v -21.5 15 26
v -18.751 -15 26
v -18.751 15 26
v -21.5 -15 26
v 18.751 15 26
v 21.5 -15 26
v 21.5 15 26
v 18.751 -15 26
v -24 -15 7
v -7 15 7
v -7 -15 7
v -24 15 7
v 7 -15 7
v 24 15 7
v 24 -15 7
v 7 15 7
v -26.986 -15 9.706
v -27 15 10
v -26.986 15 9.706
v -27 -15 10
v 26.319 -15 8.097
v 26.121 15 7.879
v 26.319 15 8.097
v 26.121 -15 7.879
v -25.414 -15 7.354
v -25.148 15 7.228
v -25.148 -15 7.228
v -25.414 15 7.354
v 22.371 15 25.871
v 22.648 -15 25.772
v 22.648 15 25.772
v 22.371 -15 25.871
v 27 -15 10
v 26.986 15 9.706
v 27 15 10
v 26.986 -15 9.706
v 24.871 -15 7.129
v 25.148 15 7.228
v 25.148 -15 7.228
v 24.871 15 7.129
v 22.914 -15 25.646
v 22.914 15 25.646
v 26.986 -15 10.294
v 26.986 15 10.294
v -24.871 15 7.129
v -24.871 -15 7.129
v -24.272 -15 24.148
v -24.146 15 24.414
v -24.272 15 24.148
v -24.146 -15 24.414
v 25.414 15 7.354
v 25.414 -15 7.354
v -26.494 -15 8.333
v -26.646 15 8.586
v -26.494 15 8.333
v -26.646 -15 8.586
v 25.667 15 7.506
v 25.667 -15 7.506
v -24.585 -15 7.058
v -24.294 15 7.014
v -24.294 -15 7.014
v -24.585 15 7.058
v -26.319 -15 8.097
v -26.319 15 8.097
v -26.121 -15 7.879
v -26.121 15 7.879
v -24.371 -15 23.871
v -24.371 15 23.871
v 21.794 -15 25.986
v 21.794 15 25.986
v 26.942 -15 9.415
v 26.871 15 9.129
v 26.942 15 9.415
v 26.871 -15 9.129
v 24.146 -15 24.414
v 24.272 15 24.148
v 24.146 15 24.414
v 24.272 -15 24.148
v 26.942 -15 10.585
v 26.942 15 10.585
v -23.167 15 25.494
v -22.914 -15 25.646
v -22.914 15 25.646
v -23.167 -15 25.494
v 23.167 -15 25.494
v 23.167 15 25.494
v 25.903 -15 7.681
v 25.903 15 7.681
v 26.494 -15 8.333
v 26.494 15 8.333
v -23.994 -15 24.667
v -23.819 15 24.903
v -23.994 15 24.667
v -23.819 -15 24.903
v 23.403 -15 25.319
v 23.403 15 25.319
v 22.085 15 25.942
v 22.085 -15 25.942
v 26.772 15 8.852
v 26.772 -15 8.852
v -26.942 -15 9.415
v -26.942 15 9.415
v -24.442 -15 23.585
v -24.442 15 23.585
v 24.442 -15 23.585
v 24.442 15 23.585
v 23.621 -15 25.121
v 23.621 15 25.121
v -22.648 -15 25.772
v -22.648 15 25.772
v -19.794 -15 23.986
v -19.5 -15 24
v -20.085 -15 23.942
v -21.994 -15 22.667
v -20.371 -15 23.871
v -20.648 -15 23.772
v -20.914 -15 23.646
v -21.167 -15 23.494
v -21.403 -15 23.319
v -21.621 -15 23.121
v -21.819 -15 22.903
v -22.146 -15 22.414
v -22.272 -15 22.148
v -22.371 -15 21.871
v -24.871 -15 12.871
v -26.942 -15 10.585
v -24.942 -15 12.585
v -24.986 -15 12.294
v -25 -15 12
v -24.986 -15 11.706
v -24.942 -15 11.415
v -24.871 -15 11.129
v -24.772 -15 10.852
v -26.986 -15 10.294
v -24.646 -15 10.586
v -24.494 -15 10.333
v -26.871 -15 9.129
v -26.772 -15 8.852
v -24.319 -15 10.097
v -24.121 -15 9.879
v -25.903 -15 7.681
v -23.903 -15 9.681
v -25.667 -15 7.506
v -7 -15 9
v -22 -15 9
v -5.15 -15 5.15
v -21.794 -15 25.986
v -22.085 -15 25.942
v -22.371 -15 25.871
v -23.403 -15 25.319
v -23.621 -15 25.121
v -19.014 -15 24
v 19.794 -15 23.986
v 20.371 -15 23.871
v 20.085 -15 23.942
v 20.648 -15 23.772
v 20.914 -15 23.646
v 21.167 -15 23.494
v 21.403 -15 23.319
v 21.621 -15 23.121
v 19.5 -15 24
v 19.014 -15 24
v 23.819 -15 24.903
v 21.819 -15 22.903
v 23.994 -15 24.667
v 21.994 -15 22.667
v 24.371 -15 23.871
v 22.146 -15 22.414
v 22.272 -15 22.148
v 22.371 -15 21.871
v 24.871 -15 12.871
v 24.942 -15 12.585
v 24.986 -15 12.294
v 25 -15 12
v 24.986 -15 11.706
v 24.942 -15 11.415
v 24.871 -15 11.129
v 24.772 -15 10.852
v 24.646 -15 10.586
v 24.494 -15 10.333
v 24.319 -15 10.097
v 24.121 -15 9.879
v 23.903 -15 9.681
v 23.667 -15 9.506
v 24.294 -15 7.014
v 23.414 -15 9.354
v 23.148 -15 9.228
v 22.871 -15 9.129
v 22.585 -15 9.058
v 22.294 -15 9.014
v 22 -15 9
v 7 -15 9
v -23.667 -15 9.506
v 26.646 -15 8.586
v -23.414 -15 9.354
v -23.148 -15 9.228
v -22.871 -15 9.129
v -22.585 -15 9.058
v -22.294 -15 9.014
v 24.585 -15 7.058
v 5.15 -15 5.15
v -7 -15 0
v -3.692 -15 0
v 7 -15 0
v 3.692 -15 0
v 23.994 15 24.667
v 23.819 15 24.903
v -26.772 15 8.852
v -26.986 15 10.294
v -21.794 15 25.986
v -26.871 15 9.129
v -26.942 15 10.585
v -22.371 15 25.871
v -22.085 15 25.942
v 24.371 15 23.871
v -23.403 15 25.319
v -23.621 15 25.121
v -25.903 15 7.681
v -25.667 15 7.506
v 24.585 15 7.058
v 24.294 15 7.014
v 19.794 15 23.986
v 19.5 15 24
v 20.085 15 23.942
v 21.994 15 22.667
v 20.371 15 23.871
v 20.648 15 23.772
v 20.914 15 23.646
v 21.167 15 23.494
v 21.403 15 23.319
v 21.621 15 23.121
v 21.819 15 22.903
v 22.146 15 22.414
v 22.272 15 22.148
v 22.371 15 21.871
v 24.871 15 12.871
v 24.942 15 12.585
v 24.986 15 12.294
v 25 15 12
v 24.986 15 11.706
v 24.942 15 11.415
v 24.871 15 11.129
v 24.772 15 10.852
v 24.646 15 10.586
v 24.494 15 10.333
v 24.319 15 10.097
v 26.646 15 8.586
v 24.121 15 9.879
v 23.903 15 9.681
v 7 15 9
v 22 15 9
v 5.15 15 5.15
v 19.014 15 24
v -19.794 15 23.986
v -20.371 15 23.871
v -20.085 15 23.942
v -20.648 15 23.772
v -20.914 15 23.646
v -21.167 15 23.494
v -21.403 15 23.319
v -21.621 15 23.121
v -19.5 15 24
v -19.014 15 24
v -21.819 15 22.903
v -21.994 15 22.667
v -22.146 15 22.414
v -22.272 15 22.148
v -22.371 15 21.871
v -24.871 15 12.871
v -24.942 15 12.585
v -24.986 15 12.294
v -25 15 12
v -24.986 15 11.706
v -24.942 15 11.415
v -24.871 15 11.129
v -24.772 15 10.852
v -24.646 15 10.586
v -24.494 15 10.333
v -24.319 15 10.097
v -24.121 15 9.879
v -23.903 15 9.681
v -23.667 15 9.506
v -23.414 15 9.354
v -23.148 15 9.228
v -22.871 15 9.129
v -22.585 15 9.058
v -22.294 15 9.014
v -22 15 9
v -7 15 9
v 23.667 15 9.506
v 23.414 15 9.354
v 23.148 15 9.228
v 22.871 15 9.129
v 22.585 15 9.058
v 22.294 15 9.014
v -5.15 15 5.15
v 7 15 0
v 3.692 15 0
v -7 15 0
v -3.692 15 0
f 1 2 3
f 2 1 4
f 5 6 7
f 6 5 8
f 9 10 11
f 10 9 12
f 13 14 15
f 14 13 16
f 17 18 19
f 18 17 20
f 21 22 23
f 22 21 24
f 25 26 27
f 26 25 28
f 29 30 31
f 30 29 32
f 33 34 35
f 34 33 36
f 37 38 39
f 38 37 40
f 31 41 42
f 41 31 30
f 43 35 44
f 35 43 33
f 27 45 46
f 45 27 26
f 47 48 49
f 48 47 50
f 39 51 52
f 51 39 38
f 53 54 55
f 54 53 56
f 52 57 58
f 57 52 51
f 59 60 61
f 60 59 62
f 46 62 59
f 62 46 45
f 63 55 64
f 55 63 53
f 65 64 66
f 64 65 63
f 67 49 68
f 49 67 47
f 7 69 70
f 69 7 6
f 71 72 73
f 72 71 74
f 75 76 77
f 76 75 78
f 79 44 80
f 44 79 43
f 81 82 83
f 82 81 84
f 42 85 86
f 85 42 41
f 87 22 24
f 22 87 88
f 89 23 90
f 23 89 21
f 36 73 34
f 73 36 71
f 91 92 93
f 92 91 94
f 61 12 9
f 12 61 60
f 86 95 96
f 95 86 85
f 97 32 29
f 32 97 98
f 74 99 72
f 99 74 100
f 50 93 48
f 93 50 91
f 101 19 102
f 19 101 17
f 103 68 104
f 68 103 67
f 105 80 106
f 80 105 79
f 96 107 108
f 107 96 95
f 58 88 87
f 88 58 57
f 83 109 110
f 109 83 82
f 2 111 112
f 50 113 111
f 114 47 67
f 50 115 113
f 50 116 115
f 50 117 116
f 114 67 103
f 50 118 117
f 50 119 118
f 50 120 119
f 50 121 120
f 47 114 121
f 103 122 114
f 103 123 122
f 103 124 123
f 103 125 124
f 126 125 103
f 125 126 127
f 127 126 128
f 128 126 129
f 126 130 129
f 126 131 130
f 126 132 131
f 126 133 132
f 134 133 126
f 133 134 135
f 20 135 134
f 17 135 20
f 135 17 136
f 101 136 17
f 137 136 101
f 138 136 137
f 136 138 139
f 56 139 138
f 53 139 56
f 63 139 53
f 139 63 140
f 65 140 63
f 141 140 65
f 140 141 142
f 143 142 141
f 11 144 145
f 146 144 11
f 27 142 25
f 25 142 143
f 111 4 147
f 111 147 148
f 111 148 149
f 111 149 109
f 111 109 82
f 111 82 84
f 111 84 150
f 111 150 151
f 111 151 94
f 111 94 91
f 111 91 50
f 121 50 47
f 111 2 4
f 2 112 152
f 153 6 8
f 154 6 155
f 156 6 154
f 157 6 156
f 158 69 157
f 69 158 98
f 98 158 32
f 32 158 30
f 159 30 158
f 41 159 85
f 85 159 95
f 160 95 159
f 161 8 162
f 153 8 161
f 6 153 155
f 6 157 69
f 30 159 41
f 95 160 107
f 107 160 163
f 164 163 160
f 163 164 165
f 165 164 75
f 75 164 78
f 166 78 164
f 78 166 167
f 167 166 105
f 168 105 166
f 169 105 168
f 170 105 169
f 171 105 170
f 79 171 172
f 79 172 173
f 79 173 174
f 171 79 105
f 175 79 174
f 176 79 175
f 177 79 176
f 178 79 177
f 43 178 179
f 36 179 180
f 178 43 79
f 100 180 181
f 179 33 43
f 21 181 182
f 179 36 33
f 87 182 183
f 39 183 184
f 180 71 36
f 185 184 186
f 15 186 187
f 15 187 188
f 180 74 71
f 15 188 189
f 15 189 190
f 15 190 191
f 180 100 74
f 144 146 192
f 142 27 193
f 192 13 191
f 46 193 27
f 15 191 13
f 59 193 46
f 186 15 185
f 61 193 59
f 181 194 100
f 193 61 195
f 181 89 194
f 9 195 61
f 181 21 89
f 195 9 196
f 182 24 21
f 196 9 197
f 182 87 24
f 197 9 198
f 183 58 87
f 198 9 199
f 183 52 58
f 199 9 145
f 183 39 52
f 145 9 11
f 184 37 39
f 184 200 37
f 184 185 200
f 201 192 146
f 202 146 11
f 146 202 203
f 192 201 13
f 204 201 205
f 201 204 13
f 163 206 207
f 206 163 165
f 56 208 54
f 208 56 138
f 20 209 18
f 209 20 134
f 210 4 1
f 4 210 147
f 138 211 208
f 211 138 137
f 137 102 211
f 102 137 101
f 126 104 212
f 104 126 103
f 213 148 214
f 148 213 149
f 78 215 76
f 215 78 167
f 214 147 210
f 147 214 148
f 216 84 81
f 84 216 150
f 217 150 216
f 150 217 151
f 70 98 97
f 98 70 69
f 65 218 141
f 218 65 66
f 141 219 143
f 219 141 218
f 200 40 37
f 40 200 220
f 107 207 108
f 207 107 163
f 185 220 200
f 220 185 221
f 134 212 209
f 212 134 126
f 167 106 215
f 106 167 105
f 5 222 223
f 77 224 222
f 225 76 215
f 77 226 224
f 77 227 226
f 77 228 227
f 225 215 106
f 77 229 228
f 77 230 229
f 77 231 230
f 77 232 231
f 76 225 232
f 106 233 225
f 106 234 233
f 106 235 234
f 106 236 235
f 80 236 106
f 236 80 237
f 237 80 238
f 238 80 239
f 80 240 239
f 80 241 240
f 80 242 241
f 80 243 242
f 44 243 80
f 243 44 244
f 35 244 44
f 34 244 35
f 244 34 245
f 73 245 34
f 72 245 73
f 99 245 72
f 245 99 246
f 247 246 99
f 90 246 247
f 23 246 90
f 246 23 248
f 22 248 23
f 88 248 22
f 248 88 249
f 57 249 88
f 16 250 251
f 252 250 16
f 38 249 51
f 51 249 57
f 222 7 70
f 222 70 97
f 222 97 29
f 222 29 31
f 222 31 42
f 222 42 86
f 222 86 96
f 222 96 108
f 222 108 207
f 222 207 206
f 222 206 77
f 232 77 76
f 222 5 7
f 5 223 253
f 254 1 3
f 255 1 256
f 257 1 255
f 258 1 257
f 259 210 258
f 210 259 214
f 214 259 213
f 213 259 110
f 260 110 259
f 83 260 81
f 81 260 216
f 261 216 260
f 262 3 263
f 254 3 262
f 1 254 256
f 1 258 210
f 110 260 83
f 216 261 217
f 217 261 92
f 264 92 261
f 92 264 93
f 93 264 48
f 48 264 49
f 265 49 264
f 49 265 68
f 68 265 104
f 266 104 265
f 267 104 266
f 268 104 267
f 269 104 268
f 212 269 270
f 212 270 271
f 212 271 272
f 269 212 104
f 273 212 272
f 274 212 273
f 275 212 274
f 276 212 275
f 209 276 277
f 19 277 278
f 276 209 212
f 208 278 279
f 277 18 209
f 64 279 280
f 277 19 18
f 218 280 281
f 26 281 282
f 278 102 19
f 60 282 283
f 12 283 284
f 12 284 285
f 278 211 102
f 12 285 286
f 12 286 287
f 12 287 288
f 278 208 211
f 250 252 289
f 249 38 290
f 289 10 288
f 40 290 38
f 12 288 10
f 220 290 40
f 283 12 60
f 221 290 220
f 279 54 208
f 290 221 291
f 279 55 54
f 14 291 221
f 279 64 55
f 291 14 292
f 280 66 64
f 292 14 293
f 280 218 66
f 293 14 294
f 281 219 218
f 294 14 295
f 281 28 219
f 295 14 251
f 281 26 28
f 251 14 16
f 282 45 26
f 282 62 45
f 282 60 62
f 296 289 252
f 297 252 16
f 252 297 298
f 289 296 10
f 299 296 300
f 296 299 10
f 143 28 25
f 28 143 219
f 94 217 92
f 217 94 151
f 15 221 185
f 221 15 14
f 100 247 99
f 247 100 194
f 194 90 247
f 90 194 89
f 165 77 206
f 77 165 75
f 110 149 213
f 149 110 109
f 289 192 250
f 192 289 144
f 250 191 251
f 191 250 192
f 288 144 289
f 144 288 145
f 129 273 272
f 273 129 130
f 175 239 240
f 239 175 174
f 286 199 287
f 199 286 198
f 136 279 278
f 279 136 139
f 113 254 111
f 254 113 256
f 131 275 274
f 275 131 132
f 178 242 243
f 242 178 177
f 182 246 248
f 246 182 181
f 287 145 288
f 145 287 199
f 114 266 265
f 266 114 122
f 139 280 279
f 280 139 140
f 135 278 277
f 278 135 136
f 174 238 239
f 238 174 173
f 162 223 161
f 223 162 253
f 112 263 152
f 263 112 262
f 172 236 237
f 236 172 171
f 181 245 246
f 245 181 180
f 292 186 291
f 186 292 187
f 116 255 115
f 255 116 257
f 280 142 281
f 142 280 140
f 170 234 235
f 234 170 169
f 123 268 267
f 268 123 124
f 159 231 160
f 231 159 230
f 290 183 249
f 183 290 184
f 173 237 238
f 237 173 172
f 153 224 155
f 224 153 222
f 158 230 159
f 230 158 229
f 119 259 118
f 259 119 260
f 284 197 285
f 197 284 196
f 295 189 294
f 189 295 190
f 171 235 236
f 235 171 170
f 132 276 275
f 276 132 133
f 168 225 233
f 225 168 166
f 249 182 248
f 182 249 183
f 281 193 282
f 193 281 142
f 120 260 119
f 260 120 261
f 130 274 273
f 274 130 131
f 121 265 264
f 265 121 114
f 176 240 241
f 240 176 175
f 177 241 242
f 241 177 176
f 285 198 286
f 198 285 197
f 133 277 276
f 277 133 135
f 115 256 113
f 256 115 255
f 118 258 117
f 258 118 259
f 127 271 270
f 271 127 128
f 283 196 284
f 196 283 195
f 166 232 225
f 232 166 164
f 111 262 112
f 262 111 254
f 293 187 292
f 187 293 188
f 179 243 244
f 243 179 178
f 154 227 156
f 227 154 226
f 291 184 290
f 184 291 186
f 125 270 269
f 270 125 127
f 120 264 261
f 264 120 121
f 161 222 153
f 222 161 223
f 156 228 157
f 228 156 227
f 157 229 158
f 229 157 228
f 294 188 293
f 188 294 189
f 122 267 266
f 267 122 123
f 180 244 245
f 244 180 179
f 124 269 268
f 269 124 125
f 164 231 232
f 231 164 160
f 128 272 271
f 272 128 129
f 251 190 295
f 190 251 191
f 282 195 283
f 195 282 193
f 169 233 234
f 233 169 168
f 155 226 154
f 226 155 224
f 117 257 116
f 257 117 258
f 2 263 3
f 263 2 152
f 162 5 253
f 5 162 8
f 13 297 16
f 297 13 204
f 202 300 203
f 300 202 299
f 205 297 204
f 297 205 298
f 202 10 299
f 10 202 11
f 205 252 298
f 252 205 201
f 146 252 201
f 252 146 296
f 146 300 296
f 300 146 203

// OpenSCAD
// =====================================
// Toothpaste Clip Piece - Test Print
// Clip + arm + dovetail channel
// Print with dovetail channel face down on bed
// =====================================

include <_toothbrush_holder.scad>

// Dovetail back face at Z = grip_outer_x - plate_thickness = 30
// Rotate so back face is down, then shift to bed
rotate([180, 0, 0])
translate([0, 0, -(grip_outer_x - plate_thickness)])
    paste_clip_piece();
